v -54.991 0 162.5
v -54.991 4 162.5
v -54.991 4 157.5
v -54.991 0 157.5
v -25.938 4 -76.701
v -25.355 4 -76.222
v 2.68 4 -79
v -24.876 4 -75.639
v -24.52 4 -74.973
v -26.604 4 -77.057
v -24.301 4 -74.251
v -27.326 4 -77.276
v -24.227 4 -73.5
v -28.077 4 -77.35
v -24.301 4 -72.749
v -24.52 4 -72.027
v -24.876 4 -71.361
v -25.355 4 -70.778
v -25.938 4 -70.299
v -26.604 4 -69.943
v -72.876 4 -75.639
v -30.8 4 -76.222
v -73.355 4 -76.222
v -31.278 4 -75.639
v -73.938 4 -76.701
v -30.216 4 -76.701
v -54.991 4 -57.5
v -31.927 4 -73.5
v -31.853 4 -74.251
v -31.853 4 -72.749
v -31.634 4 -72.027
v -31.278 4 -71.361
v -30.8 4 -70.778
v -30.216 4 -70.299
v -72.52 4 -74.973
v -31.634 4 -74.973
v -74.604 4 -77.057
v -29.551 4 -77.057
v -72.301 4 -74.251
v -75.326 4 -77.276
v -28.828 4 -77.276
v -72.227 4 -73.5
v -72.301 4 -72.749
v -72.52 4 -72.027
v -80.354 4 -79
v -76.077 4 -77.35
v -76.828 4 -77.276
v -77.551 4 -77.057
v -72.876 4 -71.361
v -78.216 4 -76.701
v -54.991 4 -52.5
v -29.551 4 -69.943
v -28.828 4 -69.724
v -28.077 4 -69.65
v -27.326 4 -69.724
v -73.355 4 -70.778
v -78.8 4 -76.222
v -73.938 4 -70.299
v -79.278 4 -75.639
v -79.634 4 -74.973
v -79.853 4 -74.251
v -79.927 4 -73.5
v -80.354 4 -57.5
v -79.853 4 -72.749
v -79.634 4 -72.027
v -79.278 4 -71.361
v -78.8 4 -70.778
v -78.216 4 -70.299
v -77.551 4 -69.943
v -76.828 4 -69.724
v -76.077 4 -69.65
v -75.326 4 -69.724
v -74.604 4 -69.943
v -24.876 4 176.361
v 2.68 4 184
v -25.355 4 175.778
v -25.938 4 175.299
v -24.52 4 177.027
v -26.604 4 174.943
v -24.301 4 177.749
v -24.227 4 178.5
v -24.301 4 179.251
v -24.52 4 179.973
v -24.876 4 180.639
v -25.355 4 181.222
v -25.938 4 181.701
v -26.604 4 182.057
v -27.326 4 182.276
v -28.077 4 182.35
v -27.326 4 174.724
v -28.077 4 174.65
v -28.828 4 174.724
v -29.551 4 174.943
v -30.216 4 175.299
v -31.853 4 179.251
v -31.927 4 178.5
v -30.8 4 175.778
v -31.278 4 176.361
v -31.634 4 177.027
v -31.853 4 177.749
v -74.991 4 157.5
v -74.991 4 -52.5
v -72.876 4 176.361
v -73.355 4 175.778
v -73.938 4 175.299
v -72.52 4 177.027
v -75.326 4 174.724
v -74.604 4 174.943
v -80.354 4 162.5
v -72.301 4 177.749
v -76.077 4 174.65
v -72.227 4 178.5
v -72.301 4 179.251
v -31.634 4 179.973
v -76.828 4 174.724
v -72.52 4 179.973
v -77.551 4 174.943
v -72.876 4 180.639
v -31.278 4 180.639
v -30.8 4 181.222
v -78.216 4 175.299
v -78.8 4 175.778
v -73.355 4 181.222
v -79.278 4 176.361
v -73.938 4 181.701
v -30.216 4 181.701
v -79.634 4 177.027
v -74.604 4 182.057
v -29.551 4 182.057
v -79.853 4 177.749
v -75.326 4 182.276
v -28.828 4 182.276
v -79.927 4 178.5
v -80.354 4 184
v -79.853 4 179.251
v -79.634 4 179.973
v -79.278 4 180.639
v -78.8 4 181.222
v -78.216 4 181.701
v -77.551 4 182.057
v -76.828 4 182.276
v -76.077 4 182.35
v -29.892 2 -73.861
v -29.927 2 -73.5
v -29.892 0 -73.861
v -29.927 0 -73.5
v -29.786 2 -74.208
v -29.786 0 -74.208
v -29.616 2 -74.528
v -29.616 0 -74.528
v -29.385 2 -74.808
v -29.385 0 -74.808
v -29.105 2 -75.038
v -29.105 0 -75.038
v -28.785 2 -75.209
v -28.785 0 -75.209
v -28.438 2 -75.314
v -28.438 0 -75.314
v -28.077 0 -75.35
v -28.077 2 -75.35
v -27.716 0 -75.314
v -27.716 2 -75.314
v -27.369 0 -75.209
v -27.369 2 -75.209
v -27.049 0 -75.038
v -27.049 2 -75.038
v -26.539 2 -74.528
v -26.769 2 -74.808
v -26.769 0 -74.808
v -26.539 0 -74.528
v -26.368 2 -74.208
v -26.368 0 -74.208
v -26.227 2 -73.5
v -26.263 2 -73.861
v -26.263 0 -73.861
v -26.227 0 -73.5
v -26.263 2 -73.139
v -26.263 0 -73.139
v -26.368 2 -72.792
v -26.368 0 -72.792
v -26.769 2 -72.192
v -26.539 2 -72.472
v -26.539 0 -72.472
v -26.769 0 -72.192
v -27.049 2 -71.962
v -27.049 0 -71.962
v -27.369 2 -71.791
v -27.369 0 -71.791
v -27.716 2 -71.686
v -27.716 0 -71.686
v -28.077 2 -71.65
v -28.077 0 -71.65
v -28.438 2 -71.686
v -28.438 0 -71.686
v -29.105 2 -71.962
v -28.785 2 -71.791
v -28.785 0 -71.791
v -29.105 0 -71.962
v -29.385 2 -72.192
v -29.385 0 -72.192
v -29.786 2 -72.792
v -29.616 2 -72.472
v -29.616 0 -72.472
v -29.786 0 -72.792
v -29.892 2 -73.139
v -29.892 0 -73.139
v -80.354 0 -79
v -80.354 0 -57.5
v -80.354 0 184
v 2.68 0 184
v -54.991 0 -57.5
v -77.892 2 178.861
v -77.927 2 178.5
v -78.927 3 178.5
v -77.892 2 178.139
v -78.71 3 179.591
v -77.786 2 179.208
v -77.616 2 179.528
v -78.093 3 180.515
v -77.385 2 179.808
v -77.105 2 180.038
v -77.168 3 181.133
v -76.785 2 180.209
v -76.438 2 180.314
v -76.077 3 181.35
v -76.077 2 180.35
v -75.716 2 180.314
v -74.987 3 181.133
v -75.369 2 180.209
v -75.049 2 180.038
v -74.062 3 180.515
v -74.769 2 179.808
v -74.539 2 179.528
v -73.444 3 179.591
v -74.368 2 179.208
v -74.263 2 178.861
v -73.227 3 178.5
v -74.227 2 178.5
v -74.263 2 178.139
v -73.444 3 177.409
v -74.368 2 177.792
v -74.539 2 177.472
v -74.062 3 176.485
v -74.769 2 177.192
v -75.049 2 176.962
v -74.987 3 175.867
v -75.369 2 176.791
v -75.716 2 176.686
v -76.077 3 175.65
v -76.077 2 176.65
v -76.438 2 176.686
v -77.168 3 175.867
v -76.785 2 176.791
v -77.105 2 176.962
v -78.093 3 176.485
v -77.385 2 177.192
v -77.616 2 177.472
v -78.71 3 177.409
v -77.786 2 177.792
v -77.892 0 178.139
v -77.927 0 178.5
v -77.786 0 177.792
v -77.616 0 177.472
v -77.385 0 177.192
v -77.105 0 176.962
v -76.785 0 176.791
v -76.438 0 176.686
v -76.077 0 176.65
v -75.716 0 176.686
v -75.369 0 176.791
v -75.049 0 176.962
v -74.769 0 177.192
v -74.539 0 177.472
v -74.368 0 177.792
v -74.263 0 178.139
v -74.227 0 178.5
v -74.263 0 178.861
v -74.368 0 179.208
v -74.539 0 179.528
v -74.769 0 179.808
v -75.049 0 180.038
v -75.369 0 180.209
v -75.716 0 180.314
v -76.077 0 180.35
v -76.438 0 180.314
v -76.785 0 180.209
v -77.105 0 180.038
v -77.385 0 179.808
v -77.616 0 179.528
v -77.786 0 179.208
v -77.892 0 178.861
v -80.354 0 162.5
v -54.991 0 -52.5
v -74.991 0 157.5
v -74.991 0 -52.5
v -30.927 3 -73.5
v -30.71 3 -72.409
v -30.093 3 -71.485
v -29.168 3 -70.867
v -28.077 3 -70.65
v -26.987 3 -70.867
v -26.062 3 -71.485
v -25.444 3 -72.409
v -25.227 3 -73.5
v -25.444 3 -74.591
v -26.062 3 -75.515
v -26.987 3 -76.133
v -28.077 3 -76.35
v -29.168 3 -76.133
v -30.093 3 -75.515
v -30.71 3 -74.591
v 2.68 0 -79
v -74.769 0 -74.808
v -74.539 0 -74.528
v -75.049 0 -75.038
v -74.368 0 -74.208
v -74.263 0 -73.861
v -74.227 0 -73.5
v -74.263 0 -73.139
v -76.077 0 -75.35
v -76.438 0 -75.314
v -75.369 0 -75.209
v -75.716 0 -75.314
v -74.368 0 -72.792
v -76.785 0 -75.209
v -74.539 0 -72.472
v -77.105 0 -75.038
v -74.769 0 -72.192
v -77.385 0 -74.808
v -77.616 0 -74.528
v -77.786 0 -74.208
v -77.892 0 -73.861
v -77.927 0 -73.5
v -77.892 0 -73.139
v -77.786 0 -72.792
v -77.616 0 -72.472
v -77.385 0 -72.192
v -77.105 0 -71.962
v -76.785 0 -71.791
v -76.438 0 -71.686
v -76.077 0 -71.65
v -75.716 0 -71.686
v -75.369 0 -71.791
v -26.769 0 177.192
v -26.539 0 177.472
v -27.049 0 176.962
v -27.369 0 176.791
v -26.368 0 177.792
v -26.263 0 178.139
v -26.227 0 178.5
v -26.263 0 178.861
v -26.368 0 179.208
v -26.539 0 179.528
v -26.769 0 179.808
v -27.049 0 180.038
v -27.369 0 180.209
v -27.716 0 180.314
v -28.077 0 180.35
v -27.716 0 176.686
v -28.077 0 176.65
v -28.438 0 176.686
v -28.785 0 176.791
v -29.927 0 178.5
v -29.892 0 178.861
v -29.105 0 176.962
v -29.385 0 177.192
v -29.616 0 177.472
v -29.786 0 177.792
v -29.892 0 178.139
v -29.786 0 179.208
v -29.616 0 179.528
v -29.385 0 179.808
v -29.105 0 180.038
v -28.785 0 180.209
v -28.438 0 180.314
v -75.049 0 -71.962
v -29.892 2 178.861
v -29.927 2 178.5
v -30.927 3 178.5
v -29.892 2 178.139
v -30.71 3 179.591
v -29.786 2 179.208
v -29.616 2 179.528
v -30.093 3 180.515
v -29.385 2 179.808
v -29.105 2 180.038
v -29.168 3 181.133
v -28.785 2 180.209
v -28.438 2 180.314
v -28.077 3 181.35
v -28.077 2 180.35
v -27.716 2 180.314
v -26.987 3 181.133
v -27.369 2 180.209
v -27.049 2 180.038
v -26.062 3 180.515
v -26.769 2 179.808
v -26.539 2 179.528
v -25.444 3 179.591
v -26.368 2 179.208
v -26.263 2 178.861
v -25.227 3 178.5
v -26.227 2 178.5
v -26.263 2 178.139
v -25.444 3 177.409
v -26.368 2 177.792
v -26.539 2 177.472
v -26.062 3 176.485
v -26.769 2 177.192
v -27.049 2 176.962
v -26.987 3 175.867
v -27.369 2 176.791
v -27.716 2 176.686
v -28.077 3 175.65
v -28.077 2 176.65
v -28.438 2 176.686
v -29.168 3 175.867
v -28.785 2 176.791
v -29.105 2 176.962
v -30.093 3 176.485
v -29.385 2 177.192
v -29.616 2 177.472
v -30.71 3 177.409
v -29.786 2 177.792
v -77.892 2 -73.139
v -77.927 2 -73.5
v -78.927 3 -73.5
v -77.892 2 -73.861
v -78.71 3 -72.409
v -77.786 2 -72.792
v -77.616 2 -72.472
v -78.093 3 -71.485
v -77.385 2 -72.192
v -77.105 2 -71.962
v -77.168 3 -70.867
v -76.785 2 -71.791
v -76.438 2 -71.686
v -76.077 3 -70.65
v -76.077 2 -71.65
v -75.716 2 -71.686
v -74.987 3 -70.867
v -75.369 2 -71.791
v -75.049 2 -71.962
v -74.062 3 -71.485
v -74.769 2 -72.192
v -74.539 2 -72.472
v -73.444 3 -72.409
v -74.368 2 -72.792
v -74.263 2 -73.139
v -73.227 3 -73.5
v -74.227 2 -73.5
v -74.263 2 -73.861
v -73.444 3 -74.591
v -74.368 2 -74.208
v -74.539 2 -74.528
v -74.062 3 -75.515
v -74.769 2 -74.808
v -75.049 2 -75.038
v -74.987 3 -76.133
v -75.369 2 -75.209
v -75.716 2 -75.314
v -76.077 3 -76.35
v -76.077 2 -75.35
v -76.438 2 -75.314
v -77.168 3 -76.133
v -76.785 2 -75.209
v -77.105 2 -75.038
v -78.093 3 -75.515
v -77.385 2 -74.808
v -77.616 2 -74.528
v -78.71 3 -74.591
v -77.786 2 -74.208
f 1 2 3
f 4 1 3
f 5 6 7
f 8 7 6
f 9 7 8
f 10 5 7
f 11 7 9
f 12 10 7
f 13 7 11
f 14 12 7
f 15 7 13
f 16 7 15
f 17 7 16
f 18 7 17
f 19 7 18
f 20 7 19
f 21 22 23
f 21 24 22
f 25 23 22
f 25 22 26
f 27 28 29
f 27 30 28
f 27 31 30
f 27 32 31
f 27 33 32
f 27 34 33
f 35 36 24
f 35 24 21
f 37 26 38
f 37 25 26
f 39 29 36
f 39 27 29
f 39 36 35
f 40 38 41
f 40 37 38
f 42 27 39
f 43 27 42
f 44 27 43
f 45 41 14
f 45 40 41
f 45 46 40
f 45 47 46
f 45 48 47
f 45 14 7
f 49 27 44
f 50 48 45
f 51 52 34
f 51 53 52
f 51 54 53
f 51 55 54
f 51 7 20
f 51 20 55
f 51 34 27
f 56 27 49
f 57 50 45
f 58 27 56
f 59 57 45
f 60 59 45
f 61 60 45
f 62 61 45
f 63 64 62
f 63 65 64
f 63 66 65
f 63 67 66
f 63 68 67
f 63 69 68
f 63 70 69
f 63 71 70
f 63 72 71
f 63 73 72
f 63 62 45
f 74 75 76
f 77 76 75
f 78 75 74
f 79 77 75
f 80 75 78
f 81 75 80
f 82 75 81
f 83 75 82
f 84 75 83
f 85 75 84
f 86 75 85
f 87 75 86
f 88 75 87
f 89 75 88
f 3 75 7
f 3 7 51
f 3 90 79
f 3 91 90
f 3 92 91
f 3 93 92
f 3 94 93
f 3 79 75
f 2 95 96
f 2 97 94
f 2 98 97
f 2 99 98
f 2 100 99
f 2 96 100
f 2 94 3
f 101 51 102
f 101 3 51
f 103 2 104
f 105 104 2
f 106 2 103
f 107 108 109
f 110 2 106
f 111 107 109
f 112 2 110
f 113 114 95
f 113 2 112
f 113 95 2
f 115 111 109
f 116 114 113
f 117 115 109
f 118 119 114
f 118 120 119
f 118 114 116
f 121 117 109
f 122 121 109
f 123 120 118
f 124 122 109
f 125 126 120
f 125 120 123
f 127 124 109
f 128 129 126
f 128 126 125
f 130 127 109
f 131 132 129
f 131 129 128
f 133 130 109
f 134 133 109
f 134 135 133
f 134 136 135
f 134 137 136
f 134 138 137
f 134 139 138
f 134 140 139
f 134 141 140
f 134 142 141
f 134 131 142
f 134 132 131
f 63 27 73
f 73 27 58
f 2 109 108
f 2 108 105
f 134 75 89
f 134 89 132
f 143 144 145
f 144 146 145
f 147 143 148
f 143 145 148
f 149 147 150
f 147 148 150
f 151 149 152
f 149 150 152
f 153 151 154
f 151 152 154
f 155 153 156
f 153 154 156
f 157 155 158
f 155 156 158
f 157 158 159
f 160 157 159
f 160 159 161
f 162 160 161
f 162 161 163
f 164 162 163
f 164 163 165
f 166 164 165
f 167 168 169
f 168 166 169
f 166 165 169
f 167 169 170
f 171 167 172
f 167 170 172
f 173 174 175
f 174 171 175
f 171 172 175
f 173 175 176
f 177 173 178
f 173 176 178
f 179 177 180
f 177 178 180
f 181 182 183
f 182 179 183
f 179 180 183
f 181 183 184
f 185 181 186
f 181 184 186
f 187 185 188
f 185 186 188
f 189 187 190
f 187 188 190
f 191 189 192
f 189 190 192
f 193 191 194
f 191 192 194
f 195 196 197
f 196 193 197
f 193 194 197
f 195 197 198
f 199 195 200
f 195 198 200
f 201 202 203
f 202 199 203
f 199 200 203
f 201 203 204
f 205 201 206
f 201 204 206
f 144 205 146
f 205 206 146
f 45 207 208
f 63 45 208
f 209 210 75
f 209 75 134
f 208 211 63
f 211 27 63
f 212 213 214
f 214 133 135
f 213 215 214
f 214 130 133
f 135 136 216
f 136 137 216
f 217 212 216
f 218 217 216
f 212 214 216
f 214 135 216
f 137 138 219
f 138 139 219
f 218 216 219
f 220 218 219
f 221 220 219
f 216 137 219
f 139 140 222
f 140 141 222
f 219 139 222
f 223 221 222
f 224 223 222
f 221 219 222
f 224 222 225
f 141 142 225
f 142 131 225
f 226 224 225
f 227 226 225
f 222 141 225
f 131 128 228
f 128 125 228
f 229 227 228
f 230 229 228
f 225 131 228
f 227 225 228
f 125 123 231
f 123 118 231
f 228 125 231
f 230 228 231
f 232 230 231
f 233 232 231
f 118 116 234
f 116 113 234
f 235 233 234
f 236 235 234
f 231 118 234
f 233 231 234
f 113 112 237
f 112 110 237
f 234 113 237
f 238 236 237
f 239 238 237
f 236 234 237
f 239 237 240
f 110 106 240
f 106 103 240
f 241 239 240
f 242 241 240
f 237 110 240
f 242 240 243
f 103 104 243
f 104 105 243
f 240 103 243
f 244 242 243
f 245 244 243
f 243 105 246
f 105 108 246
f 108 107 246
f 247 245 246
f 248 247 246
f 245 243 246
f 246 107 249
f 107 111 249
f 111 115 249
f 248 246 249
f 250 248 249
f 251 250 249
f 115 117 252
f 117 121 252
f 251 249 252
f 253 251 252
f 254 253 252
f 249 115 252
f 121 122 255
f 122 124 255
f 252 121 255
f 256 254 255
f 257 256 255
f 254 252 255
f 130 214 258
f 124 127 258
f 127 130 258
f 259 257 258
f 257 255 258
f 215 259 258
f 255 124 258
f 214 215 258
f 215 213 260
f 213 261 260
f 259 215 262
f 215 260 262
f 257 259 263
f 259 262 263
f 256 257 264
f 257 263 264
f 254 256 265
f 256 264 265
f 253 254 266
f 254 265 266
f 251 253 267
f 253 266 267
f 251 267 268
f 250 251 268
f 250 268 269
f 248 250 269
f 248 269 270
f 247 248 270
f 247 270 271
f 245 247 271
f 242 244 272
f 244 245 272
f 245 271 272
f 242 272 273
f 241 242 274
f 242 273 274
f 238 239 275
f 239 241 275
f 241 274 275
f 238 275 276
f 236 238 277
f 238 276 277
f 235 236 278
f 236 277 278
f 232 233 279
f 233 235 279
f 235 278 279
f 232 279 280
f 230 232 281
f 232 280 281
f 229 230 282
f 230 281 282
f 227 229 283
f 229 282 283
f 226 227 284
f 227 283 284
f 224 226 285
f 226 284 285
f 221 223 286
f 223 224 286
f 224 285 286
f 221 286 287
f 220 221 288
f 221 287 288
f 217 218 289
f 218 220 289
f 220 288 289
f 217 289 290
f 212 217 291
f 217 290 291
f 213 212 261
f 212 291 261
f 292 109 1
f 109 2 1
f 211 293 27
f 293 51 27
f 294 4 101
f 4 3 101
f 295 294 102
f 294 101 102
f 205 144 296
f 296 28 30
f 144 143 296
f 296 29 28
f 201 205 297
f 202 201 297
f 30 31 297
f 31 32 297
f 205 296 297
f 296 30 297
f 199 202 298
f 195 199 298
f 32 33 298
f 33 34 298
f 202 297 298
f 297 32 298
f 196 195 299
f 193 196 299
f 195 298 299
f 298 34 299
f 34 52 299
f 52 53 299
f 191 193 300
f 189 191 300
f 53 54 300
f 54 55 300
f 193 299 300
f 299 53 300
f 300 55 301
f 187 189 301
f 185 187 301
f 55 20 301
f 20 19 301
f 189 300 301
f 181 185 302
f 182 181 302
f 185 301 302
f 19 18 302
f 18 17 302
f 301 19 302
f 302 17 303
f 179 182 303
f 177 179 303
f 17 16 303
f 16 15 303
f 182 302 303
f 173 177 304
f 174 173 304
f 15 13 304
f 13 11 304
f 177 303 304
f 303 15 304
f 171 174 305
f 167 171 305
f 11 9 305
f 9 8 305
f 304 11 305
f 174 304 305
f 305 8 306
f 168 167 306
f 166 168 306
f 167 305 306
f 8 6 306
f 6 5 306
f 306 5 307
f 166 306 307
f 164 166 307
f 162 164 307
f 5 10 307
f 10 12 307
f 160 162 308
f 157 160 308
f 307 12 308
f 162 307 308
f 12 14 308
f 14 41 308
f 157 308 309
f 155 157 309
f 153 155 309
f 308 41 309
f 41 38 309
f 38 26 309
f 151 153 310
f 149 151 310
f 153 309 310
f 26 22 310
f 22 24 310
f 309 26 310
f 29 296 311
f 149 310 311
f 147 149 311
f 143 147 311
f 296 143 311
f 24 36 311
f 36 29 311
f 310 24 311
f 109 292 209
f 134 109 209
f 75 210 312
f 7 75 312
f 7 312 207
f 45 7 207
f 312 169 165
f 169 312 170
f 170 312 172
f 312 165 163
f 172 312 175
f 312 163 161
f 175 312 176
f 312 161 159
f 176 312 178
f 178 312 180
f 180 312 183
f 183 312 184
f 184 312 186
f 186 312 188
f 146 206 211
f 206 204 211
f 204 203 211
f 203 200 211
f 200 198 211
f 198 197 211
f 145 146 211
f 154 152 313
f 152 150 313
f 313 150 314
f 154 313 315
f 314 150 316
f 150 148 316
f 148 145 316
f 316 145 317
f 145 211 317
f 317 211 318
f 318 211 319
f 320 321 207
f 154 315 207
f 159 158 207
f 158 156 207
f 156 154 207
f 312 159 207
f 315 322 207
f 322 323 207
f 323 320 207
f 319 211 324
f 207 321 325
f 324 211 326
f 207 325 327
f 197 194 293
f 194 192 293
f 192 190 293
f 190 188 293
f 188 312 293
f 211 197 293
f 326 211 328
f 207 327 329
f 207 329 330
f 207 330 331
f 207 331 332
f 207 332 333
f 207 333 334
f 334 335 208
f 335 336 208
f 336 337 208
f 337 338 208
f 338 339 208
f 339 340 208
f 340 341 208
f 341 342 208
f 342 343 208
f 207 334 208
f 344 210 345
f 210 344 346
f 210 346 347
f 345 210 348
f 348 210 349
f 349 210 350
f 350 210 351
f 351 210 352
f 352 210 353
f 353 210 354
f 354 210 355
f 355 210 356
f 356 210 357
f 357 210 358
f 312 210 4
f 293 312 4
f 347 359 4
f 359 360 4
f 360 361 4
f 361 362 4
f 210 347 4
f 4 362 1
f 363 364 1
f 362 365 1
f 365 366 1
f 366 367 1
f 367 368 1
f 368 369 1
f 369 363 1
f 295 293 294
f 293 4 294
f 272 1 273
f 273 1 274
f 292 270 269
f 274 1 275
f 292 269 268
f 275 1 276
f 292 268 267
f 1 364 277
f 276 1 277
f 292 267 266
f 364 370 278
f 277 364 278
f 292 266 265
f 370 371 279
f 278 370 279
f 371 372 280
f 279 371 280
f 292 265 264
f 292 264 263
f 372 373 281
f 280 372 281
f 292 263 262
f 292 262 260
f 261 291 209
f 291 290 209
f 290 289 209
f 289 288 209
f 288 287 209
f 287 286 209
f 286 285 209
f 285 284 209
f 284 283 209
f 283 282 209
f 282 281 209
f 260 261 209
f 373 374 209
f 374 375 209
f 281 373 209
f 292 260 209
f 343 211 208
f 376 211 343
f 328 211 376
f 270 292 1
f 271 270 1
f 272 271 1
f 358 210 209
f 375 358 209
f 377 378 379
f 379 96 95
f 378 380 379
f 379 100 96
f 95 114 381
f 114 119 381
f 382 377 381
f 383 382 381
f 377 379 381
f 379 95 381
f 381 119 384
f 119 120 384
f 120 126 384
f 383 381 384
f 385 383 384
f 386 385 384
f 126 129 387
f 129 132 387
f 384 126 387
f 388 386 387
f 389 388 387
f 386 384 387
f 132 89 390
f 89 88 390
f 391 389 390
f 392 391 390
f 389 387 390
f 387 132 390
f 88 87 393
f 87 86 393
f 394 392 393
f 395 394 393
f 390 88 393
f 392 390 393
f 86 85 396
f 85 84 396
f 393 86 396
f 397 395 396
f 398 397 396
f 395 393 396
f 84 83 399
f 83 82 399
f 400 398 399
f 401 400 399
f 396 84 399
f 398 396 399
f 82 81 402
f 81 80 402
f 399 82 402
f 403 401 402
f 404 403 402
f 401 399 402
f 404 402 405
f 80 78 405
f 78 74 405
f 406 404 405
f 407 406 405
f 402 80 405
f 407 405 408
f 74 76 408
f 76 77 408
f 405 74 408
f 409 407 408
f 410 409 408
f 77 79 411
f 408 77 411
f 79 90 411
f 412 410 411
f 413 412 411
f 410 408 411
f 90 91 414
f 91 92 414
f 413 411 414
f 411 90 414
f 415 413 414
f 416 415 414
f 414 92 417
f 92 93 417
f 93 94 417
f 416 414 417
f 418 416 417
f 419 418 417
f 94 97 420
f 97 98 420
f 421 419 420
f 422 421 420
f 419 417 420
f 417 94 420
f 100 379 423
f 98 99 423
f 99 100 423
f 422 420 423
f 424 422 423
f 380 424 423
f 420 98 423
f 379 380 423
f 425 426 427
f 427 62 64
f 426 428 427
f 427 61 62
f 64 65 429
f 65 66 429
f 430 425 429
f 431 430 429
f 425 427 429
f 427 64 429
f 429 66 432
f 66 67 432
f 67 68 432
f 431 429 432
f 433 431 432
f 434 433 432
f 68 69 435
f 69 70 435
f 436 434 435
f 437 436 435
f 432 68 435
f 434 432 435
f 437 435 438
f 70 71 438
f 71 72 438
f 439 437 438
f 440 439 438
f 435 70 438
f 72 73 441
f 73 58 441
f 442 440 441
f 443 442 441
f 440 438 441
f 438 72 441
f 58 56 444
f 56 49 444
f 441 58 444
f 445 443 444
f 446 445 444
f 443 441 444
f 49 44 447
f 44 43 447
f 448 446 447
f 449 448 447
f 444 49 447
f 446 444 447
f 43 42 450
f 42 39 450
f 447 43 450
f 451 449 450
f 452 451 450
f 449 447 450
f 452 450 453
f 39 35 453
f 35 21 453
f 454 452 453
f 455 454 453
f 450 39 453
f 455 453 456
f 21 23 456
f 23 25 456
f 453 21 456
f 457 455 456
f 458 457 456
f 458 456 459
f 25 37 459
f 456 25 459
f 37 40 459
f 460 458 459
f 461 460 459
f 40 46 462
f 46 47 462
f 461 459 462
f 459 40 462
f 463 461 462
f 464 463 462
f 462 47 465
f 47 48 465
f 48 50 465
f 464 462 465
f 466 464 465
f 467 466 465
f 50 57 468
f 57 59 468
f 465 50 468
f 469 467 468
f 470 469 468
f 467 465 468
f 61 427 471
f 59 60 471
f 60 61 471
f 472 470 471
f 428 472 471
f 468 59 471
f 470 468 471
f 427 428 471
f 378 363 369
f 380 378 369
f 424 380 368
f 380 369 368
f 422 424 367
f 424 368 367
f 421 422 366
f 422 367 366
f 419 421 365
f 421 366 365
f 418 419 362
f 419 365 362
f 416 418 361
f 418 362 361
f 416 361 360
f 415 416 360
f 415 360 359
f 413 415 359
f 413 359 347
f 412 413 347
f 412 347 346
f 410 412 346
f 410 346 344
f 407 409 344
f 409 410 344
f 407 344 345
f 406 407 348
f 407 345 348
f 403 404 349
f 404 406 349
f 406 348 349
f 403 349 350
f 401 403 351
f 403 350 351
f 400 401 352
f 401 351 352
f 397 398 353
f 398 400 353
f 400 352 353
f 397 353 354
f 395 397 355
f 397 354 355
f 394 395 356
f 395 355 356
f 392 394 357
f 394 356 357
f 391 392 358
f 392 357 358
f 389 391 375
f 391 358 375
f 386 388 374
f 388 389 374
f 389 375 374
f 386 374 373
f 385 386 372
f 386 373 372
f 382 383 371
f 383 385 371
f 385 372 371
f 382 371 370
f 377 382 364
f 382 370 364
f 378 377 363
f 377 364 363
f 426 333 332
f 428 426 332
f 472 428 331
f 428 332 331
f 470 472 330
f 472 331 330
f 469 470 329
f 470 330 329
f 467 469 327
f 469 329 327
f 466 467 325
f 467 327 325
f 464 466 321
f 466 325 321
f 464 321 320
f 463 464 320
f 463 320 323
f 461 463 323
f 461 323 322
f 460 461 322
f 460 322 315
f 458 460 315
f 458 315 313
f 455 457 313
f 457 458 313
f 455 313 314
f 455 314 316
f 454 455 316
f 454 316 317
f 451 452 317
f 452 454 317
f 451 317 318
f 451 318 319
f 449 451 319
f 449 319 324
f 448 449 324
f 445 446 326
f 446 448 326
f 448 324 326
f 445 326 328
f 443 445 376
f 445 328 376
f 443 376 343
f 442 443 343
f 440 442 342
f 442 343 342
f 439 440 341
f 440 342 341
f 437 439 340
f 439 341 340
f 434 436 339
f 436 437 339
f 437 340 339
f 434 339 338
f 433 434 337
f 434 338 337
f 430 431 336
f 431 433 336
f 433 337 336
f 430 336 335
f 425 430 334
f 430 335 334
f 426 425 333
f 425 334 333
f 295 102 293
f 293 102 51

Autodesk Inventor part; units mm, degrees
ref_plane "YZ Plane" through (0, 0, 0) normal (1, 0, 0) x (0, 1, 0)
ref_plane "XZ Plane" through (0, 0, 0) normal (0, 1, 0) x (-1, 0, 0)
ref_plane "XY Plane" through (0, 0, 0) normal (0, 0, 1) x (1, 0, 0)
sketch "Эскиз1" plane through (0, 0, 0) normal (0, 1, 0) x (-1, 0, 0)
  line L0 (-2.6795, -79) -> (80.3545, -79)
  line L1 (-2.6795, 184) -> (80.3545, 184)
  circle A0 centre (28.0773, 178.5) radius 1.85
  circle A1 centre (76.0773, 178.5) radius 1.85
  circle A2 centre (76.0773, -73.5) radius 1.85
  circle A3 centre (28.0773, -73.5) radius 1.85
  line L2 (80.3545, 184) -> (-2.6795, 184)
  line L3 (-2.6795, 184) -> (-2.6795, -79)
  line L4 (-2.6795, -79) -> (80.3545, -79)
  line L5 (80.3545, -79) -> (80.3545, 184)
  point P0 (0, 0)
  point P1 (83.0251, -19)
  dimension "d7" = 5.5
  dimension "d8" = 48
  dimension "d9" = 4.2772
  dimension "d10" = 5.5
  dimension "d11" = 263
  dimension "d12" = 83.034
extrude "Выдавливание1" add sketch "Эскиз1" along normal blind 4
chamfer "Фаска1" distance 2 angle 45 4 edges at (-74.2273, 4, 178.5) (-26.2273, 4, 178.5) (-26.2273, 4, -73.5) (-74.2273, 4, -73.5)
sketch "Эскиз2" plane through (0, 4, 0) normal (0, 1, 0) x (1, 0, 0)
  line L0 (-74.9909, -157.5) -> (-74.9909, 52.5) projected
  line L1 (-74.9909, 52.5) -> (-54.9909, 52.5) projected
  line L2 (-54.9909, -157.5) -> (-74.9909, -157.5) projected
  line L3 (-54.9909, 57.5) -> (-74.9909, 57.5) projected
  line L4 (-74.9909, 57.5) -> (-79.9909, 57.5) projected
  line L5 (-79.9909, 57.5) -> (-79.9909, -162.5) projected
  line L6 (-79.9909, -162.5) -> (-74.9909, -162.5) projected
  line L7 (-74.9909, -162.5) -> (-54.9909, -162.5) projected
  line L8 (-54.9909, -162.5) -> (-54.9909, -157.5) projected
  line L9 (-54.9909, 52.5) -> (-54.9909, 57.5) projected
  point P0 (0, 0)
extrude "Выдавливание2" cut sketch "Эскиз2" against normal blind 10
thicken "Толщина2" operation add thickness 1 both sides no extend neighbours yes toward (-1, 0, 0) faces at (-79.9909, 2.6667, 15.8333)
properties part number "KB33-046-004-002 - Передняя пластина" material "Дерево (вишня)"
